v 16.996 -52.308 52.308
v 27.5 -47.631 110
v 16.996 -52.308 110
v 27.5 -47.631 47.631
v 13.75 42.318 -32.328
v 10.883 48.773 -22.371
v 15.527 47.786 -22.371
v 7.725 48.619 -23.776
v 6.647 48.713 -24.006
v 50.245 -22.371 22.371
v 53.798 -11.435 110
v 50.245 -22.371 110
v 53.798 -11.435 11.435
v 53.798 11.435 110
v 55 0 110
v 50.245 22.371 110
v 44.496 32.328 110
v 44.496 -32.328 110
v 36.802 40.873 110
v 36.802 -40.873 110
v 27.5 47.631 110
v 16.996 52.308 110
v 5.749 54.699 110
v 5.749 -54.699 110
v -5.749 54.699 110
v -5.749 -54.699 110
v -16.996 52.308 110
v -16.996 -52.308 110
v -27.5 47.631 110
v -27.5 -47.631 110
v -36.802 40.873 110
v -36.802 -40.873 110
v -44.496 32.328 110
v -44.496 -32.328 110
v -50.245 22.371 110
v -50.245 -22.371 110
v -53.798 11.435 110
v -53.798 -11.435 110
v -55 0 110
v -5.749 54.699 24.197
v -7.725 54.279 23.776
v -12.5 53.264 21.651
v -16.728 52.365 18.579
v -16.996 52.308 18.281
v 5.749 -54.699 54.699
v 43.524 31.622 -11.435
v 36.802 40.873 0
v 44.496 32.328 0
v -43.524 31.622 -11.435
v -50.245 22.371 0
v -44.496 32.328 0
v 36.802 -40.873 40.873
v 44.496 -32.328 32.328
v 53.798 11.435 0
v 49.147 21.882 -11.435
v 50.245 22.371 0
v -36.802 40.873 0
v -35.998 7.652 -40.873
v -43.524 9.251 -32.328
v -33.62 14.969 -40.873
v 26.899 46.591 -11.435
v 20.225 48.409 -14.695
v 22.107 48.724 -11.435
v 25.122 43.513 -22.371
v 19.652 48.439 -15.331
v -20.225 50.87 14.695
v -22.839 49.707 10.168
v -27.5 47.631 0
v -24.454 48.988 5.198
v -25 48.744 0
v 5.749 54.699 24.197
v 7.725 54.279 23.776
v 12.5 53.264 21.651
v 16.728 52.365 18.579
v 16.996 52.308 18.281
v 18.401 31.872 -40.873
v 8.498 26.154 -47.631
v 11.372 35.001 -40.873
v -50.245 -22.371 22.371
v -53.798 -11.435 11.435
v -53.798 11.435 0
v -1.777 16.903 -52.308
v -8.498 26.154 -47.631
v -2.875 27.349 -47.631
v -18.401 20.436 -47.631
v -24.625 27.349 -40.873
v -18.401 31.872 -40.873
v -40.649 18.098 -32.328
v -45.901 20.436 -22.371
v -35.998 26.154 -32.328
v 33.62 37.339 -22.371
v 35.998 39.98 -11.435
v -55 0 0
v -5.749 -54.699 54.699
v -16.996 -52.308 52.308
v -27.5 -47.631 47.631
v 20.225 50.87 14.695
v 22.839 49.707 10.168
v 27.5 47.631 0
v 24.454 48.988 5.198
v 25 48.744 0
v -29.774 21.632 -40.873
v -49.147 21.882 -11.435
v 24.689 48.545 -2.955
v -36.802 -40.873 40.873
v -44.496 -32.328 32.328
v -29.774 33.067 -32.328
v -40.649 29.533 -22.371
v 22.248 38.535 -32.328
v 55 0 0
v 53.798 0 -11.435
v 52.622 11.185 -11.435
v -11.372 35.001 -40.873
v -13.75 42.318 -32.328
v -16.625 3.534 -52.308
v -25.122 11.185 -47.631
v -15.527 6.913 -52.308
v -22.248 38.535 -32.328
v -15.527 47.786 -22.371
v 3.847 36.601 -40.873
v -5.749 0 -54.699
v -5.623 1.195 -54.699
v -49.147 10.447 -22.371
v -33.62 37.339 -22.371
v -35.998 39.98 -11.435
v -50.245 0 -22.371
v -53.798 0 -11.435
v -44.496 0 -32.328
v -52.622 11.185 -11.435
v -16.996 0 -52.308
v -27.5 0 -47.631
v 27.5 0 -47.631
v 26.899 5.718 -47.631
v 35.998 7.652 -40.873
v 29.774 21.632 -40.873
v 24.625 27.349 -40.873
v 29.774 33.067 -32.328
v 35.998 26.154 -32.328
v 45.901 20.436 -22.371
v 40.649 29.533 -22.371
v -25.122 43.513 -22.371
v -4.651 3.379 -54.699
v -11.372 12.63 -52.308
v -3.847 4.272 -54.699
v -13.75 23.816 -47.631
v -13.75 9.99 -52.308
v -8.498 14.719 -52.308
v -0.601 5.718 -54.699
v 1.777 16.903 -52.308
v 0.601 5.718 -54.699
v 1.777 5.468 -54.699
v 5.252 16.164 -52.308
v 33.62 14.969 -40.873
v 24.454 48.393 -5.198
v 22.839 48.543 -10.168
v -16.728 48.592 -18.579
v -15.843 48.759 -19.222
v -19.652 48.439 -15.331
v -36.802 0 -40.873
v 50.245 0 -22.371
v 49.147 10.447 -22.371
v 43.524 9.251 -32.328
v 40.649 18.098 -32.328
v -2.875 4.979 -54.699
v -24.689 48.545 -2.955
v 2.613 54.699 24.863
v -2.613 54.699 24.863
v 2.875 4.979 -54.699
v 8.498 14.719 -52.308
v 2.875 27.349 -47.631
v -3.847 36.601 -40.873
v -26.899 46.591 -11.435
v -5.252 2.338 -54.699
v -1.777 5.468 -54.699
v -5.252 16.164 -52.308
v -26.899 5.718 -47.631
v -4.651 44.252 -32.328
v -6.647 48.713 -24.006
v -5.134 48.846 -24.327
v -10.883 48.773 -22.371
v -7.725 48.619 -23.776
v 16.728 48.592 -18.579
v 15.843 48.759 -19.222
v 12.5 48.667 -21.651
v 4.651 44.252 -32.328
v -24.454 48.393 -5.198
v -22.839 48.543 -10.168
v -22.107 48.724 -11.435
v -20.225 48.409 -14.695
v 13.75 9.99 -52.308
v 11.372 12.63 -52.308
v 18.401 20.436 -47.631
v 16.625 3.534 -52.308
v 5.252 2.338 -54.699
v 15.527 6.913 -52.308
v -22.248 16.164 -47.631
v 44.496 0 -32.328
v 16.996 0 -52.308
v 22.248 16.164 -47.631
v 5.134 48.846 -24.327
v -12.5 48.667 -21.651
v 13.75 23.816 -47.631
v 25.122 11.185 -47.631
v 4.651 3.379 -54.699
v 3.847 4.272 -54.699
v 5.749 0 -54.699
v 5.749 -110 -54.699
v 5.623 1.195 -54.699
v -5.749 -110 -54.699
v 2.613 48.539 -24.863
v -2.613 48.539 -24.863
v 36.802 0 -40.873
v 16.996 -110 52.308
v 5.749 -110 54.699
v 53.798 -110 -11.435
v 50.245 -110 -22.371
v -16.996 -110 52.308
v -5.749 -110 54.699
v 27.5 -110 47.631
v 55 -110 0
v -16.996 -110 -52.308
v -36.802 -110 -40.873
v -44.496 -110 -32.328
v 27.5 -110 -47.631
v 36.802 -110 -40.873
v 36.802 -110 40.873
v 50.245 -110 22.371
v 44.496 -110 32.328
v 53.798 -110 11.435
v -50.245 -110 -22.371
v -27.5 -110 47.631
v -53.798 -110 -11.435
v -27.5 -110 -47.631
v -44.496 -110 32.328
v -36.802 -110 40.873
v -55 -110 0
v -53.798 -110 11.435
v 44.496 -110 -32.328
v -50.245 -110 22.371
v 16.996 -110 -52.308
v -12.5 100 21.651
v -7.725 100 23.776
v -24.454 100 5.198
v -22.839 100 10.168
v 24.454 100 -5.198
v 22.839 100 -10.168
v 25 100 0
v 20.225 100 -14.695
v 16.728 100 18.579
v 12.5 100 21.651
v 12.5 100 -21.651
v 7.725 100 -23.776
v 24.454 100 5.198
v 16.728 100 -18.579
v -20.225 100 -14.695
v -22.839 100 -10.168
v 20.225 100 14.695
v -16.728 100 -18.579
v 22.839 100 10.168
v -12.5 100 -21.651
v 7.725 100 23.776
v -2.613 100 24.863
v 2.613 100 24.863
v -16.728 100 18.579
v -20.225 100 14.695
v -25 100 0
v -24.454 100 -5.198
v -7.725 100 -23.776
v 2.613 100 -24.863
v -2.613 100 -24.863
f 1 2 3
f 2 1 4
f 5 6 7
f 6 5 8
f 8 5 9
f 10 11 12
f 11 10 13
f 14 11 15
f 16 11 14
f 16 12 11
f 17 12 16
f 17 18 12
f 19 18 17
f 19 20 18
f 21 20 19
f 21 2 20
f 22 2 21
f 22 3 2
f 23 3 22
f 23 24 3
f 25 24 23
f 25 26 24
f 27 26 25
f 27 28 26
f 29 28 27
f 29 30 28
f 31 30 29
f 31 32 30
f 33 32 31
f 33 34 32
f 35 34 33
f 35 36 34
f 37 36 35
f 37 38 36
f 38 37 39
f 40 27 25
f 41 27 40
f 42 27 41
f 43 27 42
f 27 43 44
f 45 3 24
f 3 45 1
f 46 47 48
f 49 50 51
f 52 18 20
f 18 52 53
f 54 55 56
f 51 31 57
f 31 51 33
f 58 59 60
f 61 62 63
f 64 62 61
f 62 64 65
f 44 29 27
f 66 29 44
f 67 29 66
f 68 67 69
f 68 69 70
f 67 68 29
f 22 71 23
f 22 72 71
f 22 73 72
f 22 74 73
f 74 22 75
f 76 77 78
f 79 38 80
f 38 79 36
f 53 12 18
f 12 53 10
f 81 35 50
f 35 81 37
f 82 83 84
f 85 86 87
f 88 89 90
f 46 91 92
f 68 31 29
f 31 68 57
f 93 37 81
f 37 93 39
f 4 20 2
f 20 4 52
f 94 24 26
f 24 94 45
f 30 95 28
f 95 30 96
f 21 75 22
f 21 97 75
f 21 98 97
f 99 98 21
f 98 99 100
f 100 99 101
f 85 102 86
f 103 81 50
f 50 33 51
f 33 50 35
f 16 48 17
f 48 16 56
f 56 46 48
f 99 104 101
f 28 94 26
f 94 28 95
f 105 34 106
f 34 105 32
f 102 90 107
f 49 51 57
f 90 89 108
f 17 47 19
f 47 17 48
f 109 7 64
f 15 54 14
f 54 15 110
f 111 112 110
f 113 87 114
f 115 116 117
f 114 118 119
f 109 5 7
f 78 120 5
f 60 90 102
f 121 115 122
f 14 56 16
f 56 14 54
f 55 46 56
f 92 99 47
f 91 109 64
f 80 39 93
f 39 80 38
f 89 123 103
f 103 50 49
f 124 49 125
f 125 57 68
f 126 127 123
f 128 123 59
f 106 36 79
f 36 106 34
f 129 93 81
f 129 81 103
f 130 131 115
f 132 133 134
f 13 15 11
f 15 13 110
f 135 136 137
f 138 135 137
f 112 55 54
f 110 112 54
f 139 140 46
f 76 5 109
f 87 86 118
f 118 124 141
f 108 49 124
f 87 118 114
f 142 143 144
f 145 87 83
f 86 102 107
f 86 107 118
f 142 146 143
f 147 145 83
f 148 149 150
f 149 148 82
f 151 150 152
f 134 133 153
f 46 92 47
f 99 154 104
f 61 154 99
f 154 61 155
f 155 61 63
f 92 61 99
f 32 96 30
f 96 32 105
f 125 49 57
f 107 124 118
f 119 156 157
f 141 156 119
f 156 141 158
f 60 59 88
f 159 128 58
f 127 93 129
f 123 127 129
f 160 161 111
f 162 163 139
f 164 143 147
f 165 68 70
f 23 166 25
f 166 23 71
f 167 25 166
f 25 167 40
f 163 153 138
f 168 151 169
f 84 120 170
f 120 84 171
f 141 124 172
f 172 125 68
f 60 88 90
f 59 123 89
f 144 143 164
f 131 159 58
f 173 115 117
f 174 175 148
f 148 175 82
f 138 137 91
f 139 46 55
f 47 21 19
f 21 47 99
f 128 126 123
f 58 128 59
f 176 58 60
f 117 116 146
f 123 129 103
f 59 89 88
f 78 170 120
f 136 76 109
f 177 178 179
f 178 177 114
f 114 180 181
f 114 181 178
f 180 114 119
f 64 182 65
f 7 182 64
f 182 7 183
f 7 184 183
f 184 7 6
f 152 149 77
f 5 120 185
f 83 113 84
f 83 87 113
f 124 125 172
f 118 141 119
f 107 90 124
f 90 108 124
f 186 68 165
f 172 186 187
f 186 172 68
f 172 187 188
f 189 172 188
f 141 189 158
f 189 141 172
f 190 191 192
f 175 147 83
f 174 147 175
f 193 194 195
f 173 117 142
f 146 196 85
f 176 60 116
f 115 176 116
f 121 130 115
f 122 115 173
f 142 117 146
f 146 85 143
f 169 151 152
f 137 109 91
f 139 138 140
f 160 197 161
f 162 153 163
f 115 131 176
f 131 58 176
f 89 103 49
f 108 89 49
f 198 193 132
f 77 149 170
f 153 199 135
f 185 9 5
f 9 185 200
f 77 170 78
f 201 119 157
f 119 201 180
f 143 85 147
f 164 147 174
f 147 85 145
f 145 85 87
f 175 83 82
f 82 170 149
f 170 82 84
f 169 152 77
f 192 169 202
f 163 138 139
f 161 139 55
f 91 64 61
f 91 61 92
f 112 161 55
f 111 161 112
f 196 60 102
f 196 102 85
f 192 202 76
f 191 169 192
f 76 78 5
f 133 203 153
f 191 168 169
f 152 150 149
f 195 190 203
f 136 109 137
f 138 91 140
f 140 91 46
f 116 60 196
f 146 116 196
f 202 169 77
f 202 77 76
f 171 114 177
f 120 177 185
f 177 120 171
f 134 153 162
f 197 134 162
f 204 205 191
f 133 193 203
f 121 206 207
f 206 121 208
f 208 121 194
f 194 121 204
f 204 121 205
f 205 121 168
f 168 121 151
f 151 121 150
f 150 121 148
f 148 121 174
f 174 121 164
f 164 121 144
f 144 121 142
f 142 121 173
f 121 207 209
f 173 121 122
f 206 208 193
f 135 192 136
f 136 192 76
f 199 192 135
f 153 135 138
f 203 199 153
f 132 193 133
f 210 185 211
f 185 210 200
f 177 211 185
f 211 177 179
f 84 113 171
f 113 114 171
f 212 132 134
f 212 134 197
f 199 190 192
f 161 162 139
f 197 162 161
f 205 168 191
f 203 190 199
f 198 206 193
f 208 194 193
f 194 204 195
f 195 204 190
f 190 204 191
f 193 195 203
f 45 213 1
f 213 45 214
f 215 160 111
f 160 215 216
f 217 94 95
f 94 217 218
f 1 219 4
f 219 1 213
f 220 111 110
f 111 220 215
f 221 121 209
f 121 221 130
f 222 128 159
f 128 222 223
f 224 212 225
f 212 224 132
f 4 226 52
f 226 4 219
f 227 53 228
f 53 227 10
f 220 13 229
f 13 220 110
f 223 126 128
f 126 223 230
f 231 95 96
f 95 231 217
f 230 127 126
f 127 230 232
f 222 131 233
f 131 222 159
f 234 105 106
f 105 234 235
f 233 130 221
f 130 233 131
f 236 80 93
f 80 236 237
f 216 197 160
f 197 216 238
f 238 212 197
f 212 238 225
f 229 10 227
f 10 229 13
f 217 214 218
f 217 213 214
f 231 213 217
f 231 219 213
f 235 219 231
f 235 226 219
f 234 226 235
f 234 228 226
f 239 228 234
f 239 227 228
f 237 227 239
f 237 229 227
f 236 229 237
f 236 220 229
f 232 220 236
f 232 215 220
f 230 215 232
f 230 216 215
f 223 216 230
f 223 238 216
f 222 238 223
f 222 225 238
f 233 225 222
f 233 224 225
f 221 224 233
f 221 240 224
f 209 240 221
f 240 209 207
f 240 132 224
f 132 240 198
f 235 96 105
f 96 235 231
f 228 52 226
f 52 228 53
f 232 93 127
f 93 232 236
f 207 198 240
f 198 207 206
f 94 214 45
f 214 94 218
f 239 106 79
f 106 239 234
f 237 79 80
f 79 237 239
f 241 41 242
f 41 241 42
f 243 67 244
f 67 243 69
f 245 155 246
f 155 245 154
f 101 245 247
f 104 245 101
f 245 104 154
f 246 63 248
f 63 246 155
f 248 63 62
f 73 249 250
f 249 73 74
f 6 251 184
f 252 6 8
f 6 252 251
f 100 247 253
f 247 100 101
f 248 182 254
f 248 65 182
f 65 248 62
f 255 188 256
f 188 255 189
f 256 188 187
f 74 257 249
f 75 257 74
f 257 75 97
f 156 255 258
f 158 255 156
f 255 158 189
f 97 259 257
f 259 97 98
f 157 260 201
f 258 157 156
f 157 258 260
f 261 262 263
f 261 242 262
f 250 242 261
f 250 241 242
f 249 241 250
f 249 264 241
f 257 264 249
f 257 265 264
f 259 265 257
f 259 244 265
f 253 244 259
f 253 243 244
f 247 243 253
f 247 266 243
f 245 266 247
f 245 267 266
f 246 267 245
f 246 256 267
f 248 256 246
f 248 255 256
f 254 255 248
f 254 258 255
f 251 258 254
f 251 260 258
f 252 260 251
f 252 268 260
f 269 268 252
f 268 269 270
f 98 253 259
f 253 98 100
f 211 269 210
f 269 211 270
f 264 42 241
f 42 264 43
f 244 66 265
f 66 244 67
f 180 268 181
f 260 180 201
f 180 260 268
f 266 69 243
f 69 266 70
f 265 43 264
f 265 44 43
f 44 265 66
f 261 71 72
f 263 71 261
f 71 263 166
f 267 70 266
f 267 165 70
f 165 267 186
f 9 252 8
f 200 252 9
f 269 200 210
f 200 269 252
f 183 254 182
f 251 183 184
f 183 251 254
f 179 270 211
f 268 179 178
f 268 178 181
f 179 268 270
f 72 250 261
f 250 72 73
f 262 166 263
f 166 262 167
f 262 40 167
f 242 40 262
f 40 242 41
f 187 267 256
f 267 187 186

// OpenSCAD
//big_cross();
big_corner();

module big_cross(){
    //rotate([0,-90,0])
    {
        hull(){
            sphere(r=110/2);
            cylinder(r=110/2,h=110);
        }
        
        hull(){
            sphere(r=110/2);
            rotate([90,0,0]) cylinder(r=110/2,h=110);
        }
        
        rotate([180,0,0])cylinder(r=50/2, h=100);
        rotate([270,0,0])cylinder(r=50/2, h=100);
    }
}
module big_corner(){
    //rotate([0,-90,0])
    {
        hull(){
            sphere(r=110/2);
            cylinder(r=110/2,h=110);
        }
        
        hull(){
            sphere(r=110/2);
            rotate([90,0,0]) cylinder(r=110/2,h=110);
        }
        
    //    rotate([180,0,0])cylinder(r=50/2, h=100);
        rotate([270,0,0])cylinder(r=50/2, h=100);
    }
}
module corner_45(){
        hull(){
            sphere(r=110/2);
            rotate([45*2,0,0]) cylinder(r=110/2,h=110);
        }    
        hull(){
            sphere(r=110/2);
            rotate([-45,0,0]) cylinder(r=110/2,h=110);
        }            
}

module corner_90(){
        hull(){
            sphere(r=110/2);
            rotate([45*2,0,0]) cylinder(r=110/2,h=110);
        }    
        hull(){
            sphere(r=110/2);
            rotate([-0,0,0]) cylinder(r=110/2,h=110);
        }            
}
